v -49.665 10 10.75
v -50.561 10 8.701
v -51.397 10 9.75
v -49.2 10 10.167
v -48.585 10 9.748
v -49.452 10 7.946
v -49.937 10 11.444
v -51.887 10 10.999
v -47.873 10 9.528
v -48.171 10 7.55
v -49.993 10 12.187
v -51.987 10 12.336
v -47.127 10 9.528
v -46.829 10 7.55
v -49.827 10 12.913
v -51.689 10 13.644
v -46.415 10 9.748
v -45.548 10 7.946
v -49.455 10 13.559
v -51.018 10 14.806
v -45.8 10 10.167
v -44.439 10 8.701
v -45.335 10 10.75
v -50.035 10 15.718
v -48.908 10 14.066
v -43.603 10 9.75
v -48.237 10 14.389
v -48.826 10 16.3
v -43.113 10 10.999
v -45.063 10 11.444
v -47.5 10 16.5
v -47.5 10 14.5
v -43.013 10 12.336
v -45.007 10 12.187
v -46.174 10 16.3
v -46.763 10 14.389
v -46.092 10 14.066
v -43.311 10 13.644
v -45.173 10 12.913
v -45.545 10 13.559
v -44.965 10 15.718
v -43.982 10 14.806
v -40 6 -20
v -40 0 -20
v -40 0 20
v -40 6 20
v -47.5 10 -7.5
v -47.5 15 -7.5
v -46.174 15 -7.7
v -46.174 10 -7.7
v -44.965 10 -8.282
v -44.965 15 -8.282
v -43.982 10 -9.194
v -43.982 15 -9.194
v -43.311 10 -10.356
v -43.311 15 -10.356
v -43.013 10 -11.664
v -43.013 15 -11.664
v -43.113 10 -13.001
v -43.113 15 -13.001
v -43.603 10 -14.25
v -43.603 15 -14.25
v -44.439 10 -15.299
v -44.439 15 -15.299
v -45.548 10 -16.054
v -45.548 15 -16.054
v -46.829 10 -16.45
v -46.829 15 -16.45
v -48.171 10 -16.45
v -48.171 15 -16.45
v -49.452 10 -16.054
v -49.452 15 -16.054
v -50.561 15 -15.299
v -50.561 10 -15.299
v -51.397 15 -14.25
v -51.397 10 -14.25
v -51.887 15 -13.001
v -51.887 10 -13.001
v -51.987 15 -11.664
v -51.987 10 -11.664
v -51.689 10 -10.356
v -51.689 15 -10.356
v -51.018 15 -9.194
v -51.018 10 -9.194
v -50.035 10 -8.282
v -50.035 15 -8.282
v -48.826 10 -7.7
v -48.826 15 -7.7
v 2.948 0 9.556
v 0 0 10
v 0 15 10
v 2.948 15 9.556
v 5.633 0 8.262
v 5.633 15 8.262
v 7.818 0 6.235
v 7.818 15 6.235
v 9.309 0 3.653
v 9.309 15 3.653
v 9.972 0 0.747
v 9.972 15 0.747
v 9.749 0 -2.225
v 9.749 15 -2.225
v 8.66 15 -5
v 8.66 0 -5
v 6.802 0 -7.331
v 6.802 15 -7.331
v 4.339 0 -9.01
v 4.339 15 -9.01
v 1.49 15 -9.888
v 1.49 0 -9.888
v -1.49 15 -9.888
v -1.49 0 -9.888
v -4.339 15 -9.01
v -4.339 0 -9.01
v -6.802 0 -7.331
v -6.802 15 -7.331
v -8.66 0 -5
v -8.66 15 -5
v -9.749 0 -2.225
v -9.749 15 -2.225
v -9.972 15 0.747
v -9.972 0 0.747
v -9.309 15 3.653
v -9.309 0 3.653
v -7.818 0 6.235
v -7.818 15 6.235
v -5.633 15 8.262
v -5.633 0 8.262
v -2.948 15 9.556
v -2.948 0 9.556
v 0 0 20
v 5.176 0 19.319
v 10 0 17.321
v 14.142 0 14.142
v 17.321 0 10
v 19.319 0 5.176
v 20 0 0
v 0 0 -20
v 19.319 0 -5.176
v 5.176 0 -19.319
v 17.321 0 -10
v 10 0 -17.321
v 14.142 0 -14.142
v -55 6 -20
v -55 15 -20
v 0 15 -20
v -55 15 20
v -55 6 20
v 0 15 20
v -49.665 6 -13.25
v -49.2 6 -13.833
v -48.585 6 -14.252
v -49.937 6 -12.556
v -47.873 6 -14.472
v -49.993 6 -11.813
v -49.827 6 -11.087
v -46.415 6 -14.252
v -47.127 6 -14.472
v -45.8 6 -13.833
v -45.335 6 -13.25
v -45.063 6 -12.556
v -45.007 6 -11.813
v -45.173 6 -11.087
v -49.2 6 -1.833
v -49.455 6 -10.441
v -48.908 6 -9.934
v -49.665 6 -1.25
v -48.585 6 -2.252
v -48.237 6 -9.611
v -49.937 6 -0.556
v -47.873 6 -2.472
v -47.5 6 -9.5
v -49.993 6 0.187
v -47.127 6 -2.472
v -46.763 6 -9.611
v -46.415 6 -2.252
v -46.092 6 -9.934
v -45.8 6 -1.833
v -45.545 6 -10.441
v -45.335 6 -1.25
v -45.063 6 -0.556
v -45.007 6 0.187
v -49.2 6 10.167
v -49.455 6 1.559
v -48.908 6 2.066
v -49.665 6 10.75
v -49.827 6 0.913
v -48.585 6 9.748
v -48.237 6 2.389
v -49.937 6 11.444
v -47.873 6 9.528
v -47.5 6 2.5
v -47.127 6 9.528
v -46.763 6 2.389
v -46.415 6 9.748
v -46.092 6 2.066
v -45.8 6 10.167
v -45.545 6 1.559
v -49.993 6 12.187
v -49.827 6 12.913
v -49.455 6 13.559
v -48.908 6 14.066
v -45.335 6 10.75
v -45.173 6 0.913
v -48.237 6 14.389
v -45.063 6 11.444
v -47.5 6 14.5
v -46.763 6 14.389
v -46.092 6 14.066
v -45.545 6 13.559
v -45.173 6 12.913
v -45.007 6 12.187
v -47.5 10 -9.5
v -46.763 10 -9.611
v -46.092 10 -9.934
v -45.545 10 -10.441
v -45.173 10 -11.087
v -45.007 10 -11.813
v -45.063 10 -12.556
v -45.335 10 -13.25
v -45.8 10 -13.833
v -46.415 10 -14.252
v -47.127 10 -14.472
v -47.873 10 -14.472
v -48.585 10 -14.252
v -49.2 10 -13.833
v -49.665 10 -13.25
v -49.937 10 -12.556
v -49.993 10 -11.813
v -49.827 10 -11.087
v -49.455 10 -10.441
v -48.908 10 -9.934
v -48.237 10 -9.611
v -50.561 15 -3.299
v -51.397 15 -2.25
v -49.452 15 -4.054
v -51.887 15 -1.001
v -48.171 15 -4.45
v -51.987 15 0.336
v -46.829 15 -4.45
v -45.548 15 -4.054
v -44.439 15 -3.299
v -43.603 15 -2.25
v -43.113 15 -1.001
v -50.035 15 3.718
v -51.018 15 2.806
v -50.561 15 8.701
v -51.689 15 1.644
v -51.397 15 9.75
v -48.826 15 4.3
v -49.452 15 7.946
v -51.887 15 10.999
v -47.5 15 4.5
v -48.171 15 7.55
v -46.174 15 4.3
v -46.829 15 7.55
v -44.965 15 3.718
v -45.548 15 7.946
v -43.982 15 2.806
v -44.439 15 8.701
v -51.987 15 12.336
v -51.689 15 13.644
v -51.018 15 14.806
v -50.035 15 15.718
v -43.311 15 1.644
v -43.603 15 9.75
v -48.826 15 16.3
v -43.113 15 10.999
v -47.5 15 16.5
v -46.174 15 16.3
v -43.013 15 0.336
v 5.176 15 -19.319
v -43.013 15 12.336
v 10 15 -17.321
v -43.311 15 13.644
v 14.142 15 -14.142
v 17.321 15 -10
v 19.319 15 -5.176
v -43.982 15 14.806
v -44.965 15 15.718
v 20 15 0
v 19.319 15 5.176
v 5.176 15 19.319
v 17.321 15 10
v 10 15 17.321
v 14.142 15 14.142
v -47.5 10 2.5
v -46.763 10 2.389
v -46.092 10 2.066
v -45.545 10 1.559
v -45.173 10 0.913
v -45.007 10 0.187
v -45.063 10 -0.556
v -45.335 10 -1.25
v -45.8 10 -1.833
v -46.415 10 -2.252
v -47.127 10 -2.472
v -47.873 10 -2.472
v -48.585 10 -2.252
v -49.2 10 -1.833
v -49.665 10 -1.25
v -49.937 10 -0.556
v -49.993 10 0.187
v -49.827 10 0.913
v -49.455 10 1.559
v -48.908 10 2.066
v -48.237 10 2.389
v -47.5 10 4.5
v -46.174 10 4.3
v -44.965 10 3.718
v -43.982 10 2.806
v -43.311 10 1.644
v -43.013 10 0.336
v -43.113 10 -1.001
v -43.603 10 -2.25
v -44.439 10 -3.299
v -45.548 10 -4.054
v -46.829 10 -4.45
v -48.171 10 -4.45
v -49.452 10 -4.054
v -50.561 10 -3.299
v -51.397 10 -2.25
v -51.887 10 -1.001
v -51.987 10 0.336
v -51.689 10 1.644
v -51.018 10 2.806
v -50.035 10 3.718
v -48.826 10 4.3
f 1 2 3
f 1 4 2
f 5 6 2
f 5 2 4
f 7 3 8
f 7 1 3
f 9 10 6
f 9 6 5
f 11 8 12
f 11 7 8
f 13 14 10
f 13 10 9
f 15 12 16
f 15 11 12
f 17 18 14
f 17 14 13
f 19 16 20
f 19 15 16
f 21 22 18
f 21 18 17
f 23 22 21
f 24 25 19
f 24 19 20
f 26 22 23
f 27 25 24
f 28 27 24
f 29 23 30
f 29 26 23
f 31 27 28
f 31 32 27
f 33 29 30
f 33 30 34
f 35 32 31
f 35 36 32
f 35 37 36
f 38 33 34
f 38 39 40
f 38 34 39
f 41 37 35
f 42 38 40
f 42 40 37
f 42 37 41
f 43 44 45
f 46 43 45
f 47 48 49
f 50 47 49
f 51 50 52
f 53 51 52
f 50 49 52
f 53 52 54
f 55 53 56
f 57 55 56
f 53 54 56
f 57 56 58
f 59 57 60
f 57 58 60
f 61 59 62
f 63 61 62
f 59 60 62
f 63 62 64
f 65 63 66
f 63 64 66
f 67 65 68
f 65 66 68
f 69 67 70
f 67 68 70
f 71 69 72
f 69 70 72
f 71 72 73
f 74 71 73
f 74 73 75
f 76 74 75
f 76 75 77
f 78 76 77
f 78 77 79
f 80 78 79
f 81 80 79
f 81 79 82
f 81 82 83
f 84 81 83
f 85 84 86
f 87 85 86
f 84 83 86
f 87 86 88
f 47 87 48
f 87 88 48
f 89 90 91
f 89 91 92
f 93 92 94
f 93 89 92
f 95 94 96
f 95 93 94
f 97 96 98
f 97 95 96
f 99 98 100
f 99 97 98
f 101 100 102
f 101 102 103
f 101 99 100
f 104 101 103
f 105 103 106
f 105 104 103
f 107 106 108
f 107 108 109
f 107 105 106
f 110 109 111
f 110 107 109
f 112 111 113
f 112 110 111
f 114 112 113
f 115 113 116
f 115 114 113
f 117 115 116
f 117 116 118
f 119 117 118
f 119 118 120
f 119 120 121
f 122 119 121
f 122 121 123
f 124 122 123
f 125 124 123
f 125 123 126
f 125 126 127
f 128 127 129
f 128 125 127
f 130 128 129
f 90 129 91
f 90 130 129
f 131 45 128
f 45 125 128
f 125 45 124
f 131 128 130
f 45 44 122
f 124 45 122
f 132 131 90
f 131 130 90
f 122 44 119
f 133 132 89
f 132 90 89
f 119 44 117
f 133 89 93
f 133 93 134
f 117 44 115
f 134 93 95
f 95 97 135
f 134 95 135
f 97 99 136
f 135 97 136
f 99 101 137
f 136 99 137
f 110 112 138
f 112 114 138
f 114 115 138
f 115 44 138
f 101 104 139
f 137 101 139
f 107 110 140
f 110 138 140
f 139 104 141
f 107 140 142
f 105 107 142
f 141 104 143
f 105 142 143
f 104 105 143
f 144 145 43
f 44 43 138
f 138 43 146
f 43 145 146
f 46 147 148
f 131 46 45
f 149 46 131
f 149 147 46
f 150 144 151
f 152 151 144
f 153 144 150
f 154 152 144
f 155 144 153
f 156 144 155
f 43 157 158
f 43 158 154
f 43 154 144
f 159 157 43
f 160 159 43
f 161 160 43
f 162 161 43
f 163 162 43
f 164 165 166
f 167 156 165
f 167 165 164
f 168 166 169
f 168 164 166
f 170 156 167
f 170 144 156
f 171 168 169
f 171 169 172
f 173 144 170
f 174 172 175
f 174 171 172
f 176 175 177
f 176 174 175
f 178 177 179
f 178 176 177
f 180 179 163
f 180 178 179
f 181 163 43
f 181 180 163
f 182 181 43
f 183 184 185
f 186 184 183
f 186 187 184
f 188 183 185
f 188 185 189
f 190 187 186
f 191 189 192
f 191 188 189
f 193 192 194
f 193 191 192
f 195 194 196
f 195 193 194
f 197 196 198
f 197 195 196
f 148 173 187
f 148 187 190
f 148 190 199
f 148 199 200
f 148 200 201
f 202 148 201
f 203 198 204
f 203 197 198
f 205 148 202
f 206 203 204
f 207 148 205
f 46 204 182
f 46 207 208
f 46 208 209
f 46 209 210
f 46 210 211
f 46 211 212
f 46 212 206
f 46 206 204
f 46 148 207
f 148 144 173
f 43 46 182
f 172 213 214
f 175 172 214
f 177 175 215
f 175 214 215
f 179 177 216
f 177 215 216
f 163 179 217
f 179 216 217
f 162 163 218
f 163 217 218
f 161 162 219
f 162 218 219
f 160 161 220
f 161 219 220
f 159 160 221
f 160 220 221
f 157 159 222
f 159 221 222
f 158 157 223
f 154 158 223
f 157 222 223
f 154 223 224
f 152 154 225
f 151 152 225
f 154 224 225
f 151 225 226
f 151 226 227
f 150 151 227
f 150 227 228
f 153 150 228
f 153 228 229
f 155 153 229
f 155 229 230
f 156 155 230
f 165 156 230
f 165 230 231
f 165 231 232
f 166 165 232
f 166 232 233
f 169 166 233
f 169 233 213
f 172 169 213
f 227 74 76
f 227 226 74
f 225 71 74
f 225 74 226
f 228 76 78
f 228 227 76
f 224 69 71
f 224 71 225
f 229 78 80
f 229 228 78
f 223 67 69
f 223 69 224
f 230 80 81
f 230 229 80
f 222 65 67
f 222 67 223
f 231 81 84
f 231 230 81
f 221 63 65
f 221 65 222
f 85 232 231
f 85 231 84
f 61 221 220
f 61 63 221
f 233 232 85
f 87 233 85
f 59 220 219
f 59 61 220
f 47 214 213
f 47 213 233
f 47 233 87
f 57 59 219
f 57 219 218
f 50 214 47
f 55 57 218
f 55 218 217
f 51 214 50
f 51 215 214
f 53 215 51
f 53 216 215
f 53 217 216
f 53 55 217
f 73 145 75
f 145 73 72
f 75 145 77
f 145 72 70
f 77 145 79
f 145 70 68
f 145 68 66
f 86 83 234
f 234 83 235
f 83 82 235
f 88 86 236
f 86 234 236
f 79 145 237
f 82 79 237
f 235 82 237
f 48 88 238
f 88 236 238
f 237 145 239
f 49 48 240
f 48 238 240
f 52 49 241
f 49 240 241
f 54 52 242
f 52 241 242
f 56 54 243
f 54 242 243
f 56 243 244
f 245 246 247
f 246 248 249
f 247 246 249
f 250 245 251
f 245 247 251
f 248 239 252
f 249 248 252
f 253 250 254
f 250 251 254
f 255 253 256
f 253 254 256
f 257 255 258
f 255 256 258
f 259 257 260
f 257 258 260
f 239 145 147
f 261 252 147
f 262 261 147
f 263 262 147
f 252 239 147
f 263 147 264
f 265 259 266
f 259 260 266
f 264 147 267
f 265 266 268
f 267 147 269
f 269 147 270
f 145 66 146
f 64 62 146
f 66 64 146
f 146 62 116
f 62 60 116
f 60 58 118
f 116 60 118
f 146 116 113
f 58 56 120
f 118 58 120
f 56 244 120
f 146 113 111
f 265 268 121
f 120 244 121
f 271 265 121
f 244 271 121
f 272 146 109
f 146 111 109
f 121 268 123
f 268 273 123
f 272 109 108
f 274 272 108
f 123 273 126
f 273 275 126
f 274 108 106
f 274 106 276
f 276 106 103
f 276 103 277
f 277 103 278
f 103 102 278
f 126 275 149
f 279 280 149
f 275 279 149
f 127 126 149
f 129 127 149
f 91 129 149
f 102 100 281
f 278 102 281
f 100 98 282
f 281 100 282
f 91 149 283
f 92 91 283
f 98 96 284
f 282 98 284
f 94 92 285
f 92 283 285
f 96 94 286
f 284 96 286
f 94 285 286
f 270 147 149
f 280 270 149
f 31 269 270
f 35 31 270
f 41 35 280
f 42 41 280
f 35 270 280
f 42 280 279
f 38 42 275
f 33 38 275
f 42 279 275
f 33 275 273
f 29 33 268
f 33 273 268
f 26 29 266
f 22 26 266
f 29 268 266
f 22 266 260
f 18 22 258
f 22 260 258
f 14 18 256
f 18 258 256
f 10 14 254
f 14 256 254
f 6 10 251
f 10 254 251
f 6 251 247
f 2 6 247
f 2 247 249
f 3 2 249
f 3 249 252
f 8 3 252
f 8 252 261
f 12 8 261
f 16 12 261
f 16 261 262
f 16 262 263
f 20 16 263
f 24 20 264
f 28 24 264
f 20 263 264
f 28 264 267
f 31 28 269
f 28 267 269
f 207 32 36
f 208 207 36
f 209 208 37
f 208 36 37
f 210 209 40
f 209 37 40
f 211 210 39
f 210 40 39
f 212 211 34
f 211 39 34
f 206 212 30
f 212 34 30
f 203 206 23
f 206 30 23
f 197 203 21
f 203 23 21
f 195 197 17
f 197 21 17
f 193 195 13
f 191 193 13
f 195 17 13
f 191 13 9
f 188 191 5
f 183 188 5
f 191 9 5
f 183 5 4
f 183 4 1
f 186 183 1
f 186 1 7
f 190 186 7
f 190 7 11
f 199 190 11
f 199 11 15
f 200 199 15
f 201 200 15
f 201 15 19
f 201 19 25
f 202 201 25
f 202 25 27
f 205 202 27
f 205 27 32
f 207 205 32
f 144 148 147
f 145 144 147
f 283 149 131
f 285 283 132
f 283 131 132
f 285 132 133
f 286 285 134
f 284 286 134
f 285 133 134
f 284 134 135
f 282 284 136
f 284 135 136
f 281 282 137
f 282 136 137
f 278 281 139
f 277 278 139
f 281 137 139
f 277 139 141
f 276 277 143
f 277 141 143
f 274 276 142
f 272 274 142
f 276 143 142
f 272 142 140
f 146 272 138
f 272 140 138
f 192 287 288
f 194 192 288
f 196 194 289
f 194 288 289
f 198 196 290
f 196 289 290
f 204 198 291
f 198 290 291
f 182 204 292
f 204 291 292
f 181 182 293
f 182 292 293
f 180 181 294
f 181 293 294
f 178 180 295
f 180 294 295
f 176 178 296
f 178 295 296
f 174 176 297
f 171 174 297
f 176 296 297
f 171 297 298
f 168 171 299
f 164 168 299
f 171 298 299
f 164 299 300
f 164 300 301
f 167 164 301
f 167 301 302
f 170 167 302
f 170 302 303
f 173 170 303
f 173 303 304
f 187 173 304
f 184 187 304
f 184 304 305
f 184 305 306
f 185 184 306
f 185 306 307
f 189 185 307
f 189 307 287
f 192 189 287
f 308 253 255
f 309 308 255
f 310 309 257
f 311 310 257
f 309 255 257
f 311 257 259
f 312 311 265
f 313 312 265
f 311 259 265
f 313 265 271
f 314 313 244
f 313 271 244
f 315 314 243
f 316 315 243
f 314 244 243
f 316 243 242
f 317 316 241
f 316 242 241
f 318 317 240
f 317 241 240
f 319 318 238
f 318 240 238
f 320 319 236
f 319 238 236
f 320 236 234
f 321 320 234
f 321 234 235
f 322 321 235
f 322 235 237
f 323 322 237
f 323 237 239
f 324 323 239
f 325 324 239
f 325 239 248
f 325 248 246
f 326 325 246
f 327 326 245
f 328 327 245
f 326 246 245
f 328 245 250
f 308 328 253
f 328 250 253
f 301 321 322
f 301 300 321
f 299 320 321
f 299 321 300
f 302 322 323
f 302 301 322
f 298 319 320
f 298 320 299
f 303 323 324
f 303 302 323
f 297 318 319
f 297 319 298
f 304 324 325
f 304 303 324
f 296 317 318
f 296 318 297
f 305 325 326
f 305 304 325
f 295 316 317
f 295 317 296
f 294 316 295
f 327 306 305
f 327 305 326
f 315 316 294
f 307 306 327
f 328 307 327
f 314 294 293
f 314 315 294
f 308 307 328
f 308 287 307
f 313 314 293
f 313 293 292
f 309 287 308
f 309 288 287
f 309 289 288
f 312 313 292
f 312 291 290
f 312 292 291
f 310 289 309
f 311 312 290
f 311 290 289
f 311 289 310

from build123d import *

# Parameters (mm, degrees)
SKETCH_1_R          = 10
EXTRUDE_1_DEPTH     = 15
SKETCH_2_W          = 15
SKETCH_2_H          = 9
EXTRUDE_2_DEPTH     = 40
CUT_EXTRUDE_1_REACH = 62.415
SKETCH_3_R          = 2.5
SKETCH_3_3_R        = 4.5
SKETCH_3_3_R_2      = 2.5
CUT_EXTRUDE_2_DEPTH = 5


with BuildPart() as part:
    # 草图1 → 凸台-拉伸1 (new body)
    with BuildSketch(Plane(origin=(0, 0, 0), x_dir=(1, 0, 0), z_dir=(0, 1, 0))):
        with BuildLine():
            Line((0, 20), (-40, 20))
            Line((-40, 20), (-40, -20))
            Line((-40, -20), (0, -20))
            ThreePointArc((0, -20), (20, 0), (0, 20))
        make_face()
        with Locations(Location((0, 0, 0), (0, 0, 270))):
            Circle(SKETCH_1_R, mode=Mode.SUBTRACT)
    extrude(amount=EXTRUDE_1_DEPTH)

    # 草图2 → 凸台-拉伸2 (add)
    with BuildSketch(Plane.XY.offset(20)):
        with Locations((-47.5, 10.5)):
            Rectangle(SKETCH_2_W, SKETCH_2_H)
    extrude(amount=-EXTRUDE_2_DEPTH)

    # 草图3 → 切除-拉伸1 (cut, up to next)
    with BuildSketch(Plane(origin=(0, 15, 0), x_dir=(1, 0, 0), z_dir=(0, 1, 0)), mode=Mode.PRIVATE) as cut_extrude_1_sk1:
        with Locations(Location((-47.5, 12, 0), (0, 0, 270))):
            Circle(SKETCH_3_R)
    cut_extrude_1_tool1 = extrude(cut_extrude_1_sk1.sketch, amount=-CUT_EXTRUDE_1_REACH, mode=Mode.PRIVATE) & part.part
    # 草图3 → 切除-拉伸1 (cut, up to next)
    with BuildSketch(Plane(origin=(0, 15, 0), x_dir=(1, 0, 0), z_dir=(0, 1, 0)), mode=Mode.PRIVATE) as cut_extrude_1_sk2:
        with Locations(Location((-47.5, 0, 0), (0, 0, 270))):
            Circle(SKETCH_3_R)
    cut_extrude_1_tool2 = extrude(cut_extrude_1_sk2.sketch, amount=-CUT_EXTRUDE_1_REACH, mode=Mode.PRIVATE) & part.part
    # 草图3 → 切除-拉伸1 (cut, up to next)
    with BuildSketch(Plane(origin=(0, 15, 0), x_dir=(1, 0, 0), z_dir=(0, 1, 0)), mode=Mode.PRIVATE) as cut_extrude_1_sk3:
        with Locations(Location((-47.5, -12, 0), (0, 0, 270))):
            Circle(SKETCH_3_R)
    cut_extrude_1_tool3 = extrude(cut_extrude_1_sk3.sketch, amount=-CUT_EXTRUDE_1_REACH, mode=Mode.PRIVATE) & part.part
    add(cut_extrude_1_tool1.solids().sort_by_distance((-47.5, 15, -12))[0], mode=Mode.SUBTRACT)
    add(cut_extrude_1_tool2.solids().sort_by_distance((-47.5, 15, 0))[0], mode=Mode.SUBTRACT)
    add(cut_extrude_1_tool3.solids().sort_by_distance((-47.5, 15, 12))[0], mode=Mode.SUBTRACT)

    # 草图3<3> → 切除-拉伸2 (cut)
    # profile 1 of 3: a face of its own
    with BuildSketch(Plane(origin=(0, 15, 0), x_dir=(1, 0, 0), z_dir=(0, 1, 0))):
        with Locations(Location((-47.5, 12, 0), (0, 0, 270))):
            Circle(SKETCH_3_3_R)
        with Locations(Location((-47.5, 12, 0), (0, 0, 270))):
            Circle(SKETCH_3_3_R_2, mode=Mode.SUBTRACT)
    # profile 2 of 3: a face of its own
    with BuildSketch(Plane(origin=(0, 15, 0), x_dir=(1, 0, 0), z_dir=(0, 1, 0))):
        with Locations(Location((-47.5, 0, 0), (0, 0, 270))):
            Circle(SKETCH_3_3_R)
        with Locations(Location((-47.5, 0, 0), (0, 0, 270))):
            Circle(SKETCH_3_3_R_2, mode=Mode.SUBTRACT)
    # profile 3 of 3: a face of its own
    with BuildSketch(Plane(origin=(0, 15, 0), x_dir=(1, 0, 0), z_dir=(0, 1, 0))):
        with Locations(Location((-47.5, -12, 0), (0, 0, 270))):
            Circle(SKETCH_3_3_R)
        with Locations(Location((-47.5, -12, 0), (0, 0, 270))):
            Circle(SKETCH_3_3_R_2, mode=Mode.SUBTRACT)
    extrude(amount=-CUT_EXTRUDE_2_DEPTH, mode=Mode.SUBTRACT)


solid = part.part
